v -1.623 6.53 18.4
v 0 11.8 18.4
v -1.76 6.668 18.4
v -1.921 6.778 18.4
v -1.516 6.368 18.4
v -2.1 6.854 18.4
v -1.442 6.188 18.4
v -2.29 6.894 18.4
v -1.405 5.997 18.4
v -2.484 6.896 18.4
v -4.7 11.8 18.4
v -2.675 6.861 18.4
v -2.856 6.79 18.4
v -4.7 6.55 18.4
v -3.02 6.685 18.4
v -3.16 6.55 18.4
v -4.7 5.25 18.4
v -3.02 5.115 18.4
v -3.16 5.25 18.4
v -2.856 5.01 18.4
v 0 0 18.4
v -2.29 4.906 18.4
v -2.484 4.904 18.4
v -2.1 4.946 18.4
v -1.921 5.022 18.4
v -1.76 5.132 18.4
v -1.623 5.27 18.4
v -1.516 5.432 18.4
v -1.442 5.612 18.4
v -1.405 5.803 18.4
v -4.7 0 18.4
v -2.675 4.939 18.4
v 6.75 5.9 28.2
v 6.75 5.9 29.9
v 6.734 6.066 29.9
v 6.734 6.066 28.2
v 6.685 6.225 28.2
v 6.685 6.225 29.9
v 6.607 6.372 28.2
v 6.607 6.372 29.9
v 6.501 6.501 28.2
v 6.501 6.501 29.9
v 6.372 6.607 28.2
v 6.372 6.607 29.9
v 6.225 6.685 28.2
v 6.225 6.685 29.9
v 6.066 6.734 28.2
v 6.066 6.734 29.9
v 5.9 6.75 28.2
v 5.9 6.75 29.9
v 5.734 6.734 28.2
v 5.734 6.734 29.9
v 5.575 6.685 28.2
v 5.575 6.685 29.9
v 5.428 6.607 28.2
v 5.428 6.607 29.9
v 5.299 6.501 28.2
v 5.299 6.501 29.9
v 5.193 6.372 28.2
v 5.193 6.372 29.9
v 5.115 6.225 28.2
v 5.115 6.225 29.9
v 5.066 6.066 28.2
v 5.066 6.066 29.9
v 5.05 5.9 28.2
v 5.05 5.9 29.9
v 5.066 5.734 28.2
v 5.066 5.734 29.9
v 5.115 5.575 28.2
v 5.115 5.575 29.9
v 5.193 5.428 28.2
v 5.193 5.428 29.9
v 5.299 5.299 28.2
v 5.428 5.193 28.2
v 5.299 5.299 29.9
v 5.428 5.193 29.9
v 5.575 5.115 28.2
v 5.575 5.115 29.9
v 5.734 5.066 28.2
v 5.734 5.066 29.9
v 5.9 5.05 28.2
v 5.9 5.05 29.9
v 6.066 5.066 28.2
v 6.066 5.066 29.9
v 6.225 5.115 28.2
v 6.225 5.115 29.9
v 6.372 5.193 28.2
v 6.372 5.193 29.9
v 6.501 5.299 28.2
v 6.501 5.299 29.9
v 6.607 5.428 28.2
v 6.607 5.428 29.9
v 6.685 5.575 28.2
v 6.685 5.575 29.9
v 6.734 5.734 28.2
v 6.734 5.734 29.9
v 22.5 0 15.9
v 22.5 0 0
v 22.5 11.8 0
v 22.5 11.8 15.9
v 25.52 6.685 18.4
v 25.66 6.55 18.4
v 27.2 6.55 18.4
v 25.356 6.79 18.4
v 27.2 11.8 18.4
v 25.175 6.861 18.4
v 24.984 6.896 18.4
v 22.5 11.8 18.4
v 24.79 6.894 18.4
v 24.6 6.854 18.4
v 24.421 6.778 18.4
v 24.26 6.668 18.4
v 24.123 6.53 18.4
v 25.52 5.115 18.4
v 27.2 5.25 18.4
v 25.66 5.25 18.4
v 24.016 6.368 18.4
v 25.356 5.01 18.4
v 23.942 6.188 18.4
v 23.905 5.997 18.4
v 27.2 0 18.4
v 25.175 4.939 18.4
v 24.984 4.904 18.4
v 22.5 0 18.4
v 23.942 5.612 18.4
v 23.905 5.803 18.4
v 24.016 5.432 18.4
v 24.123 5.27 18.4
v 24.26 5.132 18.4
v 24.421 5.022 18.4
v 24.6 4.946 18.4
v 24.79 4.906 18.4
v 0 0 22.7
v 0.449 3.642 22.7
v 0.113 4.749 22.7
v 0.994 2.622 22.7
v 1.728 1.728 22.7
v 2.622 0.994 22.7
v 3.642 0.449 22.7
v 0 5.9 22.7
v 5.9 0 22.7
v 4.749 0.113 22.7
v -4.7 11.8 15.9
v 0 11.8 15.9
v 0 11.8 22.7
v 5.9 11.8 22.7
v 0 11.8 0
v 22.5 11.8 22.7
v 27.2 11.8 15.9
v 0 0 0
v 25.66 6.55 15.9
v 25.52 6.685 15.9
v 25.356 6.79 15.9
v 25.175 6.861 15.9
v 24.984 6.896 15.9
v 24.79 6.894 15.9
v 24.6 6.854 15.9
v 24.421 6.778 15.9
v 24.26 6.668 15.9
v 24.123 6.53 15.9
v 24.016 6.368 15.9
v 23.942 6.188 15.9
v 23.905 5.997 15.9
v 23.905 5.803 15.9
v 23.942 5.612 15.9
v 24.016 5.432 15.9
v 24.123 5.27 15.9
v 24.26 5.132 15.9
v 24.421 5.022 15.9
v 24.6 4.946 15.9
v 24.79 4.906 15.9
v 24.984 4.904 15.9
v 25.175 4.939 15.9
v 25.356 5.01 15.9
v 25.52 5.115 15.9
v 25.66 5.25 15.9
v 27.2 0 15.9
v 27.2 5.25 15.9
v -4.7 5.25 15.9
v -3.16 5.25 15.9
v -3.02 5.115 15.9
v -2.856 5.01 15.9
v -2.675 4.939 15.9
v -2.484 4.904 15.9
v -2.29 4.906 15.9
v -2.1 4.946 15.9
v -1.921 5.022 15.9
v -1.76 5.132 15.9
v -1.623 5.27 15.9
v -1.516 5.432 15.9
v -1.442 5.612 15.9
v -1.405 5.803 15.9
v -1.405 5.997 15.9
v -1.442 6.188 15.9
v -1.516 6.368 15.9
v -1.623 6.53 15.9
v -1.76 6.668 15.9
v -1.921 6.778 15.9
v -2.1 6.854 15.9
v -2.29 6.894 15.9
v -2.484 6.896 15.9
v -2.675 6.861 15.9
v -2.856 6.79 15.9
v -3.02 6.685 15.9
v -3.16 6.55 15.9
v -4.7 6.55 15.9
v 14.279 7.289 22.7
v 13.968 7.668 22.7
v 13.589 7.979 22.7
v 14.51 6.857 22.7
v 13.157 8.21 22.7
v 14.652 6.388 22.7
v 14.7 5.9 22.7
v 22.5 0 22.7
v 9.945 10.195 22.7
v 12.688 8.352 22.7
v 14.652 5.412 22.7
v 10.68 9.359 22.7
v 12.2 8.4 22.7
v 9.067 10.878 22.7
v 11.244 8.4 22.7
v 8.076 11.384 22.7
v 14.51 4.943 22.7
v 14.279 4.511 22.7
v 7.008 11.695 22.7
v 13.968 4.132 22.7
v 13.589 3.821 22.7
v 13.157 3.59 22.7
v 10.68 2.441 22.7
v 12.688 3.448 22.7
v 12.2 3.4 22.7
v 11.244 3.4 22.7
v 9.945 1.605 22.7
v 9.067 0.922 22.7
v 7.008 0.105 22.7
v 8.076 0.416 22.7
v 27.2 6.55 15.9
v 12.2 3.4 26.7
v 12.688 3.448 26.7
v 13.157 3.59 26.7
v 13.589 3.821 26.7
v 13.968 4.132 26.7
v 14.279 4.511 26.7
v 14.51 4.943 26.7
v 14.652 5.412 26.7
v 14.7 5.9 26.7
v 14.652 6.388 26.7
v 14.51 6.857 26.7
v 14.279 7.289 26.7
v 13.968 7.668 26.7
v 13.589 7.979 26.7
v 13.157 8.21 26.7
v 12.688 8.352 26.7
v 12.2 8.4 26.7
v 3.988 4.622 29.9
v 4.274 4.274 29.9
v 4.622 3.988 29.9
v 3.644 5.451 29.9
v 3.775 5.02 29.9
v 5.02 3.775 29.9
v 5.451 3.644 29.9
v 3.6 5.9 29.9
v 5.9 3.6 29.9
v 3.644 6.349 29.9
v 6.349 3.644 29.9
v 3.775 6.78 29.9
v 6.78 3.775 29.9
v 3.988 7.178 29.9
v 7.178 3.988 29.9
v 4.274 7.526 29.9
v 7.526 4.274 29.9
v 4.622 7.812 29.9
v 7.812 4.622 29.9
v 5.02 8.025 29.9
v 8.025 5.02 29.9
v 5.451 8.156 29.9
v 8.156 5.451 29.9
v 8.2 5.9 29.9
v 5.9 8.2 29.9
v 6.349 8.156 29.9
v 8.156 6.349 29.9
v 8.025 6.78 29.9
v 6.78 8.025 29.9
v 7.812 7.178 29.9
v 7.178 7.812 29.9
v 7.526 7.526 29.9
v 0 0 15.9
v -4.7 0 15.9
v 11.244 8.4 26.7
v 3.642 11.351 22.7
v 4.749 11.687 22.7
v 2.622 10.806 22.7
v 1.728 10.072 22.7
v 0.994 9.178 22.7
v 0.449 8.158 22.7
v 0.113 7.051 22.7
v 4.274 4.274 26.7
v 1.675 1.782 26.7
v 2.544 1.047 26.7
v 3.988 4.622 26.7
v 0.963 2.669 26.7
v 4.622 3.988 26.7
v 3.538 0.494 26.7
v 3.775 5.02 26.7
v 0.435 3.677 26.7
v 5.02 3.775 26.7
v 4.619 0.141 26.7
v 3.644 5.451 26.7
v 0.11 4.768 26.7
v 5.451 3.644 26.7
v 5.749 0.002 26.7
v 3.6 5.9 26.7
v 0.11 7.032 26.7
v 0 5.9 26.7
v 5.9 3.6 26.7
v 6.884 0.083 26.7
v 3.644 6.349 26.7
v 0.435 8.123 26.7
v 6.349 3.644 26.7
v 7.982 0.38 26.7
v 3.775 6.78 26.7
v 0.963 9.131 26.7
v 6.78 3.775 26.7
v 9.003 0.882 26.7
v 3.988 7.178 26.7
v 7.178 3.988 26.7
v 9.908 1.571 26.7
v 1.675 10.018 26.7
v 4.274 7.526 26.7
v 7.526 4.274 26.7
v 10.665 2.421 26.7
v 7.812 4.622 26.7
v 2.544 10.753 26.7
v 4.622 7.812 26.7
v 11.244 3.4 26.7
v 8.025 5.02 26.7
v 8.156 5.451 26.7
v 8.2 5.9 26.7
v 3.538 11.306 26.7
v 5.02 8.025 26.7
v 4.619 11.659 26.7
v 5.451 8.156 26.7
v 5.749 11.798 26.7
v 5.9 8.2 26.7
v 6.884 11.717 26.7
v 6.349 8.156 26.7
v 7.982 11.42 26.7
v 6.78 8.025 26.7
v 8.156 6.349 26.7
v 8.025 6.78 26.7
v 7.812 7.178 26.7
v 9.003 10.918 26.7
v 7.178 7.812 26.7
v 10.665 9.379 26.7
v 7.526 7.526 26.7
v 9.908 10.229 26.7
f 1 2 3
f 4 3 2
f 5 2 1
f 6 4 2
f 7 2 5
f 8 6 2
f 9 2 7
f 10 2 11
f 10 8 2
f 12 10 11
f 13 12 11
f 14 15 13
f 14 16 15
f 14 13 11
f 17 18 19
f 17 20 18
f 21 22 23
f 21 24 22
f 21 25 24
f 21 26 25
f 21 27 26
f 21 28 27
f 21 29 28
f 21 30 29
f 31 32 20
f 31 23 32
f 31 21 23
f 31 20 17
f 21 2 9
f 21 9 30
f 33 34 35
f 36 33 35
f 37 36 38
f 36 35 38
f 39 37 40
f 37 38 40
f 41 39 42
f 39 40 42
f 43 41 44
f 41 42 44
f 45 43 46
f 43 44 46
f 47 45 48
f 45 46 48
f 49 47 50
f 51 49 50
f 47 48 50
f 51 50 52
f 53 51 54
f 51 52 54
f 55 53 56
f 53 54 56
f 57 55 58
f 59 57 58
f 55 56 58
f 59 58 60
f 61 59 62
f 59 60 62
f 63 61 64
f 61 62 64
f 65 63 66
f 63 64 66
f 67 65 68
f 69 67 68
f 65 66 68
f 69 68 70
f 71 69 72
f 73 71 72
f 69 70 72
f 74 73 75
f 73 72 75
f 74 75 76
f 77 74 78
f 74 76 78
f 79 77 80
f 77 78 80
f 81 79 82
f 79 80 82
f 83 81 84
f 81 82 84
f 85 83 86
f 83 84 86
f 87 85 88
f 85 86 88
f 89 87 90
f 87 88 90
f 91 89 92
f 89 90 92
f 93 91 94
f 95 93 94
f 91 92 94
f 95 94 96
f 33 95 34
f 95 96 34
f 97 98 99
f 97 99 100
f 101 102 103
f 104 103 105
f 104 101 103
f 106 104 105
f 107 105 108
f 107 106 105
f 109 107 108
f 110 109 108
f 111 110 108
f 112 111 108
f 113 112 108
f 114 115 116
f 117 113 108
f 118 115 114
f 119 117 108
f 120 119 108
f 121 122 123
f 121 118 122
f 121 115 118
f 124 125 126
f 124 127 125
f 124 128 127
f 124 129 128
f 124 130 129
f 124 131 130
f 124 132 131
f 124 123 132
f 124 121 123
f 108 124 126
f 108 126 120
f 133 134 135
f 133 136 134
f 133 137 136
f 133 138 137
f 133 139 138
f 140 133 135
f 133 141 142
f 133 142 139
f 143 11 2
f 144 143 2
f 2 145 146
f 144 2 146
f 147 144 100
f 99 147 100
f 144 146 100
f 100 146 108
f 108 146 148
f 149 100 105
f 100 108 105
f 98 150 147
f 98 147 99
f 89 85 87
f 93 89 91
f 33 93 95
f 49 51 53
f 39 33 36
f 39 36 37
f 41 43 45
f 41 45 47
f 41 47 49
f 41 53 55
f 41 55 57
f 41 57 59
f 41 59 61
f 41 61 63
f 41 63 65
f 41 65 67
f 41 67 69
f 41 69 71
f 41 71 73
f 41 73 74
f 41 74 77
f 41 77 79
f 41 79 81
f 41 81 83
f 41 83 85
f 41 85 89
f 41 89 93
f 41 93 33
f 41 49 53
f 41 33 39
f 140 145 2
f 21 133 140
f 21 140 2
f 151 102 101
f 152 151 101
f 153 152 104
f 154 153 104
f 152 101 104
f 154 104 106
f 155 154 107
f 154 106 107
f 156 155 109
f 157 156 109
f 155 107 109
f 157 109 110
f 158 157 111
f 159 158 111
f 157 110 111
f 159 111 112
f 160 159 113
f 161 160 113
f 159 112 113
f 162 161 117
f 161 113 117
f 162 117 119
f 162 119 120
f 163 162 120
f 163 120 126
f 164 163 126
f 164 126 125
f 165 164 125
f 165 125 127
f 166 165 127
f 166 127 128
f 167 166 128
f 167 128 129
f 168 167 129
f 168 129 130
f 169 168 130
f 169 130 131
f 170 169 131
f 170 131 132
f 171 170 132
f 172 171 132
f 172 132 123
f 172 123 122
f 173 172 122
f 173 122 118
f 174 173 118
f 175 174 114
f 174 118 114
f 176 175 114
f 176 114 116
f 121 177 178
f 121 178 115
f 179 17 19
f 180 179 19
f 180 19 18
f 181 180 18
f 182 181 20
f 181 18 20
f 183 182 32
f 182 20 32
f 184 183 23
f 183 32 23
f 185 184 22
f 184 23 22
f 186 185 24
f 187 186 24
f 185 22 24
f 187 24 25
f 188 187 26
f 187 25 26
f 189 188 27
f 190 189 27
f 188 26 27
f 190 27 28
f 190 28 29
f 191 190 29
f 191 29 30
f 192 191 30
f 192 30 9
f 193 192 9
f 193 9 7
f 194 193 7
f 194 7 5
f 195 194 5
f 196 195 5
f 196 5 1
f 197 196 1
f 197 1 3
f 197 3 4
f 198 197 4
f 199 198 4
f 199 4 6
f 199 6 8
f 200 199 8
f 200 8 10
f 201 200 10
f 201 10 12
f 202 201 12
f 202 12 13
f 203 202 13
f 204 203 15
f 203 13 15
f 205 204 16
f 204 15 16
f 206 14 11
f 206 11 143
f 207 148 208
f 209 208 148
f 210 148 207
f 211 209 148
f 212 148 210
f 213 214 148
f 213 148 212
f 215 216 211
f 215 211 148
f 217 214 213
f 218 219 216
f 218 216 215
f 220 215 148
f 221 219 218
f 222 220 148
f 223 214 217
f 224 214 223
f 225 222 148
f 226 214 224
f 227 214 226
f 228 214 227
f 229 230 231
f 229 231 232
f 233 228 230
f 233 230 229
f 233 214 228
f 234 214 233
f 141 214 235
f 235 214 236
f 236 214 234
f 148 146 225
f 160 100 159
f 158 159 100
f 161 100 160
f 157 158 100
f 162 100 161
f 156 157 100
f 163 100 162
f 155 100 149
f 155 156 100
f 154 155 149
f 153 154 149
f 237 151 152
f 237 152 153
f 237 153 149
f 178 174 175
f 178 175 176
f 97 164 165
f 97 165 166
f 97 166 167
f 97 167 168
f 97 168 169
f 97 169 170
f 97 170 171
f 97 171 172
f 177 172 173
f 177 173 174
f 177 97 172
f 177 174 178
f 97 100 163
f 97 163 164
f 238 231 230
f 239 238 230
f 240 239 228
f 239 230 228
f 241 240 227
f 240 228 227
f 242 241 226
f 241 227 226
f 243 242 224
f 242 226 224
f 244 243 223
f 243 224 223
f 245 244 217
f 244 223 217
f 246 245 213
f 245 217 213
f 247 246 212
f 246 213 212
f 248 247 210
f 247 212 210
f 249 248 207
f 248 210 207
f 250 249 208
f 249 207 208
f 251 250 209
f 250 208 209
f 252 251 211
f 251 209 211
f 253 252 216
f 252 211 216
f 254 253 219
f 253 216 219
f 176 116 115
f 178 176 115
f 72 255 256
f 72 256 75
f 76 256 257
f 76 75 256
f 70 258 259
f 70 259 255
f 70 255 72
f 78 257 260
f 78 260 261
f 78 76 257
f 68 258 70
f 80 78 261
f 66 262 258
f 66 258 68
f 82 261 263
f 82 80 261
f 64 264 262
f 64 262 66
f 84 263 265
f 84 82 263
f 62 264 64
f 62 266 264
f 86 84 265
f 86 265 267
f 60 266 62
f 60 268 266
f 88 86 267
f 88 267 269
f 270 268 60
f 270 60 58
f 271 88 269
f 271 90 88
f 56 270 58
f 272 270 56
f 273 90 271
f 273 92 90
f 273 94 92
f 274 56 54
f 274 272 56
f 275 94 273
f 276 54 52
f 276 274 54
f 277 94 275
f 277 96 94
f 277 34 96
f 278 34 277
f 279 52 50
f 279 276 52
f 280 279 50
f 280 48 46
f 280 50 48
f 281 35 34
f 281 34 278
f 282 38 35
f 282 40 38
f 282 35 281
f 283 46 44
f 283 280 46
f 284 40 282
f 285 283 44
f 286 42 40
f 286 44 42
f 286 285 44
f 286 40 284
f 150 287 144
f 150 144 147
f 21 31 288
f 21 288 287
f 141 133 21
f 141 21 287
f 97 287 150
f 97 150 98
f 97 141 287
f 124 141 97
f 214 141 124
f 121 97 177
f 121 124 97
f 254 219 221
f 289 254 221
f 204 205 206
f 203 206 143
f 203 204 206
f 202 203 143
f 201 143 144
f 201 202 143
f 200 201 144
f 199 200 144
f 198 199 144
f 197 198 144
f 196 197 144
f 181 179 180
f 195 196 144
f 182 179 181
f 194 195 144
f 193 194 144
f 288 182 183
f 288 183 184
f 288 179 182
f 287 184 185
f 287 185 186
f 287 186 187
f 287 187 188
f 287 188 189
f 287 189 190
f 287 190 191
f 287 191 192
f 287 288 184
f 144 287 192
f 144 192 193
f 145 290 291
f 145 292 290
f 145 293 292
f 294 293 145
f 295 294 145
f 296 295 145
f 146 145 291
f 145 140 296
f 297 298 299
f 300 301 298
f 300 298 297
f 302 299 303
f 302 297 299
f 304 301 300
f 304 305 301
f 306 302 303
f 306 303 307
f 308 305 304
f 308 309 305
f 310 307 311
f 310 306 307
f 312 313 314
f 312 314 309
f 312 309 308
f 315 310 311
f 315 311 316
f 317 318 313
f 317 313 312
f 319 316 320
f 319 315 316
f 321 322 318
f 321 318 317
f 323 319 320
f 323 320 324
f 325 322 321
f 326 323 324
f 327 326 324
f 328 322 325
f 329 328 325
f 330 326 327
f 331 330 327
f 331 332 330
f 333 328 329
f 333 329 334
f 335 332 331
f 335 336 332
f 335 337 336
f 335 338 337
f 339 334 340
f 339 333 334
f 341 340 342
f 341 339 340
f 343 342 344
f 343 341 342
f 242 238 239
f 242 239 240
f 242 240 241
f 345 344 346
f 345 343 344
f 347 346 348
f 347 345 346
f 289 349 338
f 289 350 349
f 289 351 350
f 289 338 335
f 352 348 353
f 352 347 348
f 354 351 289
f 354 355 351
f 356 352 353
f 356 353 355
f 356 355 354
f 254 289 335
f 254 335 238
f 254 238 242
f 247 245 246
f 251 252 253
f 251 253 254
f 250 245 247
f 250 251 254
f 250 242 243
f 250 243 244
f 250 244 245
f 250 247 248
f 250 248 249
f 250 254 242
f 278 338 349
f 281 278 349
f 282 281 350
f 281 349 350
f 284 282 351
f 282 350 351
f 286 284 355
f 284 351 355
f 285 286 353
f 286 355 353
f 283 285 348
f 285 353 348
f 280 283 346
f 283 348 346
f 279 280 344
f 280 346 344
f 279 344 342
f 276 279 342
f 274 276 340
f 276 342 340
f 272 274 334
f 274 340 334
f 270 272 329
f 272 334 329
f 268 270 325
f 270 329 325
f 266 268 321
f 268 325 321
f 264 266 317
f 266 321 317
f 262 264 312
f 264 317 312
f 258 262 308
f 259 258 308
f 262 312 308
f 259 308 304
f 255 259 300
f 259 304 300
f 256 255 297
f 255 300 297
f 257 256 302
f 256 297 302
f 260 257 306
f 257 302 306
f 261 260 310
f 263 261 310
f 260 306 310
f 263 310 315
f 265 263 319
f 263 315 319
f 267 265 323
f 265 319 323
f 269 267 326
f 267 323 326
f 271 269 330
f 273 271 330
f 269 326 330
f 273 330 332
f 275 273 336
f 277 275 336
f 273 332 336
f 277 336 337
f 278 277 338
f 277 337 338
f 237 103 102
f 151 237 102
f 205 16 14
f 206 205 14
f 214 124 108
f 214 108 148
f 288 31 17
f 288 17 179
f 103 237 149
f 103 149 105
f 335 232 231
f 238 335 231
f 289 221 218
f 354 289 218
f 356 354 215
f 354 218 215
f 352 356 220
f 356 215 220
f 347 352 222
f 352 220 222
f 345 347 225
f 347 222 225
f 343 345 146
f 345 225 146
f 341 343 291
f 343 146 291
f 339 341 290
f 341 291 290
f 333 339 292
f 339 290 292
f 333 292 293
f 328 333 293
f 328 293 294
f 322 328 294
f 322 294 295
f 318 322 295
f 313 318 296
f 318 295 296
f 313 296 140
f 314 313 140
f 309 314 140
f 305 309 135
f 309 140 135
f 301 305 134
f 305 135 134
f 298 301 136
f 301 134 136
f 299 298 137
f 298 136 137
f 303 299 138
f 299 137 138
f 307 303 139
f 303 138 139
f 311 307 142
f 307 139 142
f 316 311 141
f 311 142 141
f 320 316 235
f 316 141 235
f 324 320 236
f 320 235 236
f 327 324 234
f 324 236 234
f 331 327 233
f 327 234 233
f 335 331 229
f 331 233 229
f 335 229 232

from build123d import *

# Parameters (mm, degrees)
F1_DEPTH  = 11.8
F3_DEPTH  = 4
F5_DEPTH  = 25
F7_DEPTH  = 25
F8_R      = 2.3
F9_DEPTH  = 3.2
F10_R     = 0.85
F11_DEPTH = 1.7


with BuildPart() as f1:
    # F0 (on Front) → F1 (new body)
    with BuildSketch(Plane.XZ):
        Polygon((0, 15.9), (0, 0), (22.5, 0), (22.5, 15.9), (27.2, 15.9), (27.2, 18.4), (22.5, 18.4), (22.5, 22.7), (0, 22.7), (0, 18.4), (-4.7, 18.4), (-4.7, 15.9), align=None)
    extrude(amount=-F1_DEPTH)

    # F2 (on face) → F3 (join)
    with BuildSketch(Plane.XY.offset(22.7)):
        with BuildLine():
            Line((12.2, 8.4), (11.244156, 8.4))
            ThreePointArc((11.244156, 8.4), (0, 5.9), (11.244156, 3.4))
            Line((11.244156, 3.4), (12.2, 3.4))
            ThreePointArc((12.2, 3.4), (14.7, 5.9), (12.2, 8.4))
        make_face()
    extrude(amount=F3_DEPTH)

    # F4 (on face) → F5 (cut)
    with BuildSketch(Plane.XY.offset(18.4)):
        with BuildLine():
            Line((27.2, 5.25), (27.2, 6.55))
            Line((27.2, 6.55), (25.659934, 6.55))
            ThreePointArc((25.659934, 6.55), (23.9, 5.9), (25.659934, 5.25))
            Line((25.659934, 5.25), (27.2, 5.25))
        make_face()
    extrude(amount=-F5_DEPTH, mode=Mode.SUBTRACT)

    # F6 (on face) → F7 (cut)
    with BuildSketch(Plane.XY.offset(18.4)):
        with BuildLine():
            Line((-3.159934, 6.55), (-4.7, 6.55))
            Line((-4.7, 6.55), (-4.7, 5.25))
            Line((-4.7, 5.25), (-3.159934, 5.25))
            ThreePointArc((-3.159934, 5.25), (-1.4, 5.9), (-3.159934, 6.55))
        make_face()
    extrude(amount=-F7_DEPTH, mode=Mode.SUBTRACT)

    # F8 (on face) → F9 (join)
    with BuildSketch(Plane.XY.offset(26.7)):
        with Locations((5.9, 5.9)):
            Circle(F8_R)
    extrude(amount=F9_DEPTH)

    # F10 (on face) → F11 (cut)
    with BuildSketch(Plane.XY.offset(29.9)):
        with Locations((5.9, 5.9)):
            Circle(F10_R)
    extrude(amount=-F11_DEPTH, mode=Mode.SUBTRACT)


solid = f1.part
